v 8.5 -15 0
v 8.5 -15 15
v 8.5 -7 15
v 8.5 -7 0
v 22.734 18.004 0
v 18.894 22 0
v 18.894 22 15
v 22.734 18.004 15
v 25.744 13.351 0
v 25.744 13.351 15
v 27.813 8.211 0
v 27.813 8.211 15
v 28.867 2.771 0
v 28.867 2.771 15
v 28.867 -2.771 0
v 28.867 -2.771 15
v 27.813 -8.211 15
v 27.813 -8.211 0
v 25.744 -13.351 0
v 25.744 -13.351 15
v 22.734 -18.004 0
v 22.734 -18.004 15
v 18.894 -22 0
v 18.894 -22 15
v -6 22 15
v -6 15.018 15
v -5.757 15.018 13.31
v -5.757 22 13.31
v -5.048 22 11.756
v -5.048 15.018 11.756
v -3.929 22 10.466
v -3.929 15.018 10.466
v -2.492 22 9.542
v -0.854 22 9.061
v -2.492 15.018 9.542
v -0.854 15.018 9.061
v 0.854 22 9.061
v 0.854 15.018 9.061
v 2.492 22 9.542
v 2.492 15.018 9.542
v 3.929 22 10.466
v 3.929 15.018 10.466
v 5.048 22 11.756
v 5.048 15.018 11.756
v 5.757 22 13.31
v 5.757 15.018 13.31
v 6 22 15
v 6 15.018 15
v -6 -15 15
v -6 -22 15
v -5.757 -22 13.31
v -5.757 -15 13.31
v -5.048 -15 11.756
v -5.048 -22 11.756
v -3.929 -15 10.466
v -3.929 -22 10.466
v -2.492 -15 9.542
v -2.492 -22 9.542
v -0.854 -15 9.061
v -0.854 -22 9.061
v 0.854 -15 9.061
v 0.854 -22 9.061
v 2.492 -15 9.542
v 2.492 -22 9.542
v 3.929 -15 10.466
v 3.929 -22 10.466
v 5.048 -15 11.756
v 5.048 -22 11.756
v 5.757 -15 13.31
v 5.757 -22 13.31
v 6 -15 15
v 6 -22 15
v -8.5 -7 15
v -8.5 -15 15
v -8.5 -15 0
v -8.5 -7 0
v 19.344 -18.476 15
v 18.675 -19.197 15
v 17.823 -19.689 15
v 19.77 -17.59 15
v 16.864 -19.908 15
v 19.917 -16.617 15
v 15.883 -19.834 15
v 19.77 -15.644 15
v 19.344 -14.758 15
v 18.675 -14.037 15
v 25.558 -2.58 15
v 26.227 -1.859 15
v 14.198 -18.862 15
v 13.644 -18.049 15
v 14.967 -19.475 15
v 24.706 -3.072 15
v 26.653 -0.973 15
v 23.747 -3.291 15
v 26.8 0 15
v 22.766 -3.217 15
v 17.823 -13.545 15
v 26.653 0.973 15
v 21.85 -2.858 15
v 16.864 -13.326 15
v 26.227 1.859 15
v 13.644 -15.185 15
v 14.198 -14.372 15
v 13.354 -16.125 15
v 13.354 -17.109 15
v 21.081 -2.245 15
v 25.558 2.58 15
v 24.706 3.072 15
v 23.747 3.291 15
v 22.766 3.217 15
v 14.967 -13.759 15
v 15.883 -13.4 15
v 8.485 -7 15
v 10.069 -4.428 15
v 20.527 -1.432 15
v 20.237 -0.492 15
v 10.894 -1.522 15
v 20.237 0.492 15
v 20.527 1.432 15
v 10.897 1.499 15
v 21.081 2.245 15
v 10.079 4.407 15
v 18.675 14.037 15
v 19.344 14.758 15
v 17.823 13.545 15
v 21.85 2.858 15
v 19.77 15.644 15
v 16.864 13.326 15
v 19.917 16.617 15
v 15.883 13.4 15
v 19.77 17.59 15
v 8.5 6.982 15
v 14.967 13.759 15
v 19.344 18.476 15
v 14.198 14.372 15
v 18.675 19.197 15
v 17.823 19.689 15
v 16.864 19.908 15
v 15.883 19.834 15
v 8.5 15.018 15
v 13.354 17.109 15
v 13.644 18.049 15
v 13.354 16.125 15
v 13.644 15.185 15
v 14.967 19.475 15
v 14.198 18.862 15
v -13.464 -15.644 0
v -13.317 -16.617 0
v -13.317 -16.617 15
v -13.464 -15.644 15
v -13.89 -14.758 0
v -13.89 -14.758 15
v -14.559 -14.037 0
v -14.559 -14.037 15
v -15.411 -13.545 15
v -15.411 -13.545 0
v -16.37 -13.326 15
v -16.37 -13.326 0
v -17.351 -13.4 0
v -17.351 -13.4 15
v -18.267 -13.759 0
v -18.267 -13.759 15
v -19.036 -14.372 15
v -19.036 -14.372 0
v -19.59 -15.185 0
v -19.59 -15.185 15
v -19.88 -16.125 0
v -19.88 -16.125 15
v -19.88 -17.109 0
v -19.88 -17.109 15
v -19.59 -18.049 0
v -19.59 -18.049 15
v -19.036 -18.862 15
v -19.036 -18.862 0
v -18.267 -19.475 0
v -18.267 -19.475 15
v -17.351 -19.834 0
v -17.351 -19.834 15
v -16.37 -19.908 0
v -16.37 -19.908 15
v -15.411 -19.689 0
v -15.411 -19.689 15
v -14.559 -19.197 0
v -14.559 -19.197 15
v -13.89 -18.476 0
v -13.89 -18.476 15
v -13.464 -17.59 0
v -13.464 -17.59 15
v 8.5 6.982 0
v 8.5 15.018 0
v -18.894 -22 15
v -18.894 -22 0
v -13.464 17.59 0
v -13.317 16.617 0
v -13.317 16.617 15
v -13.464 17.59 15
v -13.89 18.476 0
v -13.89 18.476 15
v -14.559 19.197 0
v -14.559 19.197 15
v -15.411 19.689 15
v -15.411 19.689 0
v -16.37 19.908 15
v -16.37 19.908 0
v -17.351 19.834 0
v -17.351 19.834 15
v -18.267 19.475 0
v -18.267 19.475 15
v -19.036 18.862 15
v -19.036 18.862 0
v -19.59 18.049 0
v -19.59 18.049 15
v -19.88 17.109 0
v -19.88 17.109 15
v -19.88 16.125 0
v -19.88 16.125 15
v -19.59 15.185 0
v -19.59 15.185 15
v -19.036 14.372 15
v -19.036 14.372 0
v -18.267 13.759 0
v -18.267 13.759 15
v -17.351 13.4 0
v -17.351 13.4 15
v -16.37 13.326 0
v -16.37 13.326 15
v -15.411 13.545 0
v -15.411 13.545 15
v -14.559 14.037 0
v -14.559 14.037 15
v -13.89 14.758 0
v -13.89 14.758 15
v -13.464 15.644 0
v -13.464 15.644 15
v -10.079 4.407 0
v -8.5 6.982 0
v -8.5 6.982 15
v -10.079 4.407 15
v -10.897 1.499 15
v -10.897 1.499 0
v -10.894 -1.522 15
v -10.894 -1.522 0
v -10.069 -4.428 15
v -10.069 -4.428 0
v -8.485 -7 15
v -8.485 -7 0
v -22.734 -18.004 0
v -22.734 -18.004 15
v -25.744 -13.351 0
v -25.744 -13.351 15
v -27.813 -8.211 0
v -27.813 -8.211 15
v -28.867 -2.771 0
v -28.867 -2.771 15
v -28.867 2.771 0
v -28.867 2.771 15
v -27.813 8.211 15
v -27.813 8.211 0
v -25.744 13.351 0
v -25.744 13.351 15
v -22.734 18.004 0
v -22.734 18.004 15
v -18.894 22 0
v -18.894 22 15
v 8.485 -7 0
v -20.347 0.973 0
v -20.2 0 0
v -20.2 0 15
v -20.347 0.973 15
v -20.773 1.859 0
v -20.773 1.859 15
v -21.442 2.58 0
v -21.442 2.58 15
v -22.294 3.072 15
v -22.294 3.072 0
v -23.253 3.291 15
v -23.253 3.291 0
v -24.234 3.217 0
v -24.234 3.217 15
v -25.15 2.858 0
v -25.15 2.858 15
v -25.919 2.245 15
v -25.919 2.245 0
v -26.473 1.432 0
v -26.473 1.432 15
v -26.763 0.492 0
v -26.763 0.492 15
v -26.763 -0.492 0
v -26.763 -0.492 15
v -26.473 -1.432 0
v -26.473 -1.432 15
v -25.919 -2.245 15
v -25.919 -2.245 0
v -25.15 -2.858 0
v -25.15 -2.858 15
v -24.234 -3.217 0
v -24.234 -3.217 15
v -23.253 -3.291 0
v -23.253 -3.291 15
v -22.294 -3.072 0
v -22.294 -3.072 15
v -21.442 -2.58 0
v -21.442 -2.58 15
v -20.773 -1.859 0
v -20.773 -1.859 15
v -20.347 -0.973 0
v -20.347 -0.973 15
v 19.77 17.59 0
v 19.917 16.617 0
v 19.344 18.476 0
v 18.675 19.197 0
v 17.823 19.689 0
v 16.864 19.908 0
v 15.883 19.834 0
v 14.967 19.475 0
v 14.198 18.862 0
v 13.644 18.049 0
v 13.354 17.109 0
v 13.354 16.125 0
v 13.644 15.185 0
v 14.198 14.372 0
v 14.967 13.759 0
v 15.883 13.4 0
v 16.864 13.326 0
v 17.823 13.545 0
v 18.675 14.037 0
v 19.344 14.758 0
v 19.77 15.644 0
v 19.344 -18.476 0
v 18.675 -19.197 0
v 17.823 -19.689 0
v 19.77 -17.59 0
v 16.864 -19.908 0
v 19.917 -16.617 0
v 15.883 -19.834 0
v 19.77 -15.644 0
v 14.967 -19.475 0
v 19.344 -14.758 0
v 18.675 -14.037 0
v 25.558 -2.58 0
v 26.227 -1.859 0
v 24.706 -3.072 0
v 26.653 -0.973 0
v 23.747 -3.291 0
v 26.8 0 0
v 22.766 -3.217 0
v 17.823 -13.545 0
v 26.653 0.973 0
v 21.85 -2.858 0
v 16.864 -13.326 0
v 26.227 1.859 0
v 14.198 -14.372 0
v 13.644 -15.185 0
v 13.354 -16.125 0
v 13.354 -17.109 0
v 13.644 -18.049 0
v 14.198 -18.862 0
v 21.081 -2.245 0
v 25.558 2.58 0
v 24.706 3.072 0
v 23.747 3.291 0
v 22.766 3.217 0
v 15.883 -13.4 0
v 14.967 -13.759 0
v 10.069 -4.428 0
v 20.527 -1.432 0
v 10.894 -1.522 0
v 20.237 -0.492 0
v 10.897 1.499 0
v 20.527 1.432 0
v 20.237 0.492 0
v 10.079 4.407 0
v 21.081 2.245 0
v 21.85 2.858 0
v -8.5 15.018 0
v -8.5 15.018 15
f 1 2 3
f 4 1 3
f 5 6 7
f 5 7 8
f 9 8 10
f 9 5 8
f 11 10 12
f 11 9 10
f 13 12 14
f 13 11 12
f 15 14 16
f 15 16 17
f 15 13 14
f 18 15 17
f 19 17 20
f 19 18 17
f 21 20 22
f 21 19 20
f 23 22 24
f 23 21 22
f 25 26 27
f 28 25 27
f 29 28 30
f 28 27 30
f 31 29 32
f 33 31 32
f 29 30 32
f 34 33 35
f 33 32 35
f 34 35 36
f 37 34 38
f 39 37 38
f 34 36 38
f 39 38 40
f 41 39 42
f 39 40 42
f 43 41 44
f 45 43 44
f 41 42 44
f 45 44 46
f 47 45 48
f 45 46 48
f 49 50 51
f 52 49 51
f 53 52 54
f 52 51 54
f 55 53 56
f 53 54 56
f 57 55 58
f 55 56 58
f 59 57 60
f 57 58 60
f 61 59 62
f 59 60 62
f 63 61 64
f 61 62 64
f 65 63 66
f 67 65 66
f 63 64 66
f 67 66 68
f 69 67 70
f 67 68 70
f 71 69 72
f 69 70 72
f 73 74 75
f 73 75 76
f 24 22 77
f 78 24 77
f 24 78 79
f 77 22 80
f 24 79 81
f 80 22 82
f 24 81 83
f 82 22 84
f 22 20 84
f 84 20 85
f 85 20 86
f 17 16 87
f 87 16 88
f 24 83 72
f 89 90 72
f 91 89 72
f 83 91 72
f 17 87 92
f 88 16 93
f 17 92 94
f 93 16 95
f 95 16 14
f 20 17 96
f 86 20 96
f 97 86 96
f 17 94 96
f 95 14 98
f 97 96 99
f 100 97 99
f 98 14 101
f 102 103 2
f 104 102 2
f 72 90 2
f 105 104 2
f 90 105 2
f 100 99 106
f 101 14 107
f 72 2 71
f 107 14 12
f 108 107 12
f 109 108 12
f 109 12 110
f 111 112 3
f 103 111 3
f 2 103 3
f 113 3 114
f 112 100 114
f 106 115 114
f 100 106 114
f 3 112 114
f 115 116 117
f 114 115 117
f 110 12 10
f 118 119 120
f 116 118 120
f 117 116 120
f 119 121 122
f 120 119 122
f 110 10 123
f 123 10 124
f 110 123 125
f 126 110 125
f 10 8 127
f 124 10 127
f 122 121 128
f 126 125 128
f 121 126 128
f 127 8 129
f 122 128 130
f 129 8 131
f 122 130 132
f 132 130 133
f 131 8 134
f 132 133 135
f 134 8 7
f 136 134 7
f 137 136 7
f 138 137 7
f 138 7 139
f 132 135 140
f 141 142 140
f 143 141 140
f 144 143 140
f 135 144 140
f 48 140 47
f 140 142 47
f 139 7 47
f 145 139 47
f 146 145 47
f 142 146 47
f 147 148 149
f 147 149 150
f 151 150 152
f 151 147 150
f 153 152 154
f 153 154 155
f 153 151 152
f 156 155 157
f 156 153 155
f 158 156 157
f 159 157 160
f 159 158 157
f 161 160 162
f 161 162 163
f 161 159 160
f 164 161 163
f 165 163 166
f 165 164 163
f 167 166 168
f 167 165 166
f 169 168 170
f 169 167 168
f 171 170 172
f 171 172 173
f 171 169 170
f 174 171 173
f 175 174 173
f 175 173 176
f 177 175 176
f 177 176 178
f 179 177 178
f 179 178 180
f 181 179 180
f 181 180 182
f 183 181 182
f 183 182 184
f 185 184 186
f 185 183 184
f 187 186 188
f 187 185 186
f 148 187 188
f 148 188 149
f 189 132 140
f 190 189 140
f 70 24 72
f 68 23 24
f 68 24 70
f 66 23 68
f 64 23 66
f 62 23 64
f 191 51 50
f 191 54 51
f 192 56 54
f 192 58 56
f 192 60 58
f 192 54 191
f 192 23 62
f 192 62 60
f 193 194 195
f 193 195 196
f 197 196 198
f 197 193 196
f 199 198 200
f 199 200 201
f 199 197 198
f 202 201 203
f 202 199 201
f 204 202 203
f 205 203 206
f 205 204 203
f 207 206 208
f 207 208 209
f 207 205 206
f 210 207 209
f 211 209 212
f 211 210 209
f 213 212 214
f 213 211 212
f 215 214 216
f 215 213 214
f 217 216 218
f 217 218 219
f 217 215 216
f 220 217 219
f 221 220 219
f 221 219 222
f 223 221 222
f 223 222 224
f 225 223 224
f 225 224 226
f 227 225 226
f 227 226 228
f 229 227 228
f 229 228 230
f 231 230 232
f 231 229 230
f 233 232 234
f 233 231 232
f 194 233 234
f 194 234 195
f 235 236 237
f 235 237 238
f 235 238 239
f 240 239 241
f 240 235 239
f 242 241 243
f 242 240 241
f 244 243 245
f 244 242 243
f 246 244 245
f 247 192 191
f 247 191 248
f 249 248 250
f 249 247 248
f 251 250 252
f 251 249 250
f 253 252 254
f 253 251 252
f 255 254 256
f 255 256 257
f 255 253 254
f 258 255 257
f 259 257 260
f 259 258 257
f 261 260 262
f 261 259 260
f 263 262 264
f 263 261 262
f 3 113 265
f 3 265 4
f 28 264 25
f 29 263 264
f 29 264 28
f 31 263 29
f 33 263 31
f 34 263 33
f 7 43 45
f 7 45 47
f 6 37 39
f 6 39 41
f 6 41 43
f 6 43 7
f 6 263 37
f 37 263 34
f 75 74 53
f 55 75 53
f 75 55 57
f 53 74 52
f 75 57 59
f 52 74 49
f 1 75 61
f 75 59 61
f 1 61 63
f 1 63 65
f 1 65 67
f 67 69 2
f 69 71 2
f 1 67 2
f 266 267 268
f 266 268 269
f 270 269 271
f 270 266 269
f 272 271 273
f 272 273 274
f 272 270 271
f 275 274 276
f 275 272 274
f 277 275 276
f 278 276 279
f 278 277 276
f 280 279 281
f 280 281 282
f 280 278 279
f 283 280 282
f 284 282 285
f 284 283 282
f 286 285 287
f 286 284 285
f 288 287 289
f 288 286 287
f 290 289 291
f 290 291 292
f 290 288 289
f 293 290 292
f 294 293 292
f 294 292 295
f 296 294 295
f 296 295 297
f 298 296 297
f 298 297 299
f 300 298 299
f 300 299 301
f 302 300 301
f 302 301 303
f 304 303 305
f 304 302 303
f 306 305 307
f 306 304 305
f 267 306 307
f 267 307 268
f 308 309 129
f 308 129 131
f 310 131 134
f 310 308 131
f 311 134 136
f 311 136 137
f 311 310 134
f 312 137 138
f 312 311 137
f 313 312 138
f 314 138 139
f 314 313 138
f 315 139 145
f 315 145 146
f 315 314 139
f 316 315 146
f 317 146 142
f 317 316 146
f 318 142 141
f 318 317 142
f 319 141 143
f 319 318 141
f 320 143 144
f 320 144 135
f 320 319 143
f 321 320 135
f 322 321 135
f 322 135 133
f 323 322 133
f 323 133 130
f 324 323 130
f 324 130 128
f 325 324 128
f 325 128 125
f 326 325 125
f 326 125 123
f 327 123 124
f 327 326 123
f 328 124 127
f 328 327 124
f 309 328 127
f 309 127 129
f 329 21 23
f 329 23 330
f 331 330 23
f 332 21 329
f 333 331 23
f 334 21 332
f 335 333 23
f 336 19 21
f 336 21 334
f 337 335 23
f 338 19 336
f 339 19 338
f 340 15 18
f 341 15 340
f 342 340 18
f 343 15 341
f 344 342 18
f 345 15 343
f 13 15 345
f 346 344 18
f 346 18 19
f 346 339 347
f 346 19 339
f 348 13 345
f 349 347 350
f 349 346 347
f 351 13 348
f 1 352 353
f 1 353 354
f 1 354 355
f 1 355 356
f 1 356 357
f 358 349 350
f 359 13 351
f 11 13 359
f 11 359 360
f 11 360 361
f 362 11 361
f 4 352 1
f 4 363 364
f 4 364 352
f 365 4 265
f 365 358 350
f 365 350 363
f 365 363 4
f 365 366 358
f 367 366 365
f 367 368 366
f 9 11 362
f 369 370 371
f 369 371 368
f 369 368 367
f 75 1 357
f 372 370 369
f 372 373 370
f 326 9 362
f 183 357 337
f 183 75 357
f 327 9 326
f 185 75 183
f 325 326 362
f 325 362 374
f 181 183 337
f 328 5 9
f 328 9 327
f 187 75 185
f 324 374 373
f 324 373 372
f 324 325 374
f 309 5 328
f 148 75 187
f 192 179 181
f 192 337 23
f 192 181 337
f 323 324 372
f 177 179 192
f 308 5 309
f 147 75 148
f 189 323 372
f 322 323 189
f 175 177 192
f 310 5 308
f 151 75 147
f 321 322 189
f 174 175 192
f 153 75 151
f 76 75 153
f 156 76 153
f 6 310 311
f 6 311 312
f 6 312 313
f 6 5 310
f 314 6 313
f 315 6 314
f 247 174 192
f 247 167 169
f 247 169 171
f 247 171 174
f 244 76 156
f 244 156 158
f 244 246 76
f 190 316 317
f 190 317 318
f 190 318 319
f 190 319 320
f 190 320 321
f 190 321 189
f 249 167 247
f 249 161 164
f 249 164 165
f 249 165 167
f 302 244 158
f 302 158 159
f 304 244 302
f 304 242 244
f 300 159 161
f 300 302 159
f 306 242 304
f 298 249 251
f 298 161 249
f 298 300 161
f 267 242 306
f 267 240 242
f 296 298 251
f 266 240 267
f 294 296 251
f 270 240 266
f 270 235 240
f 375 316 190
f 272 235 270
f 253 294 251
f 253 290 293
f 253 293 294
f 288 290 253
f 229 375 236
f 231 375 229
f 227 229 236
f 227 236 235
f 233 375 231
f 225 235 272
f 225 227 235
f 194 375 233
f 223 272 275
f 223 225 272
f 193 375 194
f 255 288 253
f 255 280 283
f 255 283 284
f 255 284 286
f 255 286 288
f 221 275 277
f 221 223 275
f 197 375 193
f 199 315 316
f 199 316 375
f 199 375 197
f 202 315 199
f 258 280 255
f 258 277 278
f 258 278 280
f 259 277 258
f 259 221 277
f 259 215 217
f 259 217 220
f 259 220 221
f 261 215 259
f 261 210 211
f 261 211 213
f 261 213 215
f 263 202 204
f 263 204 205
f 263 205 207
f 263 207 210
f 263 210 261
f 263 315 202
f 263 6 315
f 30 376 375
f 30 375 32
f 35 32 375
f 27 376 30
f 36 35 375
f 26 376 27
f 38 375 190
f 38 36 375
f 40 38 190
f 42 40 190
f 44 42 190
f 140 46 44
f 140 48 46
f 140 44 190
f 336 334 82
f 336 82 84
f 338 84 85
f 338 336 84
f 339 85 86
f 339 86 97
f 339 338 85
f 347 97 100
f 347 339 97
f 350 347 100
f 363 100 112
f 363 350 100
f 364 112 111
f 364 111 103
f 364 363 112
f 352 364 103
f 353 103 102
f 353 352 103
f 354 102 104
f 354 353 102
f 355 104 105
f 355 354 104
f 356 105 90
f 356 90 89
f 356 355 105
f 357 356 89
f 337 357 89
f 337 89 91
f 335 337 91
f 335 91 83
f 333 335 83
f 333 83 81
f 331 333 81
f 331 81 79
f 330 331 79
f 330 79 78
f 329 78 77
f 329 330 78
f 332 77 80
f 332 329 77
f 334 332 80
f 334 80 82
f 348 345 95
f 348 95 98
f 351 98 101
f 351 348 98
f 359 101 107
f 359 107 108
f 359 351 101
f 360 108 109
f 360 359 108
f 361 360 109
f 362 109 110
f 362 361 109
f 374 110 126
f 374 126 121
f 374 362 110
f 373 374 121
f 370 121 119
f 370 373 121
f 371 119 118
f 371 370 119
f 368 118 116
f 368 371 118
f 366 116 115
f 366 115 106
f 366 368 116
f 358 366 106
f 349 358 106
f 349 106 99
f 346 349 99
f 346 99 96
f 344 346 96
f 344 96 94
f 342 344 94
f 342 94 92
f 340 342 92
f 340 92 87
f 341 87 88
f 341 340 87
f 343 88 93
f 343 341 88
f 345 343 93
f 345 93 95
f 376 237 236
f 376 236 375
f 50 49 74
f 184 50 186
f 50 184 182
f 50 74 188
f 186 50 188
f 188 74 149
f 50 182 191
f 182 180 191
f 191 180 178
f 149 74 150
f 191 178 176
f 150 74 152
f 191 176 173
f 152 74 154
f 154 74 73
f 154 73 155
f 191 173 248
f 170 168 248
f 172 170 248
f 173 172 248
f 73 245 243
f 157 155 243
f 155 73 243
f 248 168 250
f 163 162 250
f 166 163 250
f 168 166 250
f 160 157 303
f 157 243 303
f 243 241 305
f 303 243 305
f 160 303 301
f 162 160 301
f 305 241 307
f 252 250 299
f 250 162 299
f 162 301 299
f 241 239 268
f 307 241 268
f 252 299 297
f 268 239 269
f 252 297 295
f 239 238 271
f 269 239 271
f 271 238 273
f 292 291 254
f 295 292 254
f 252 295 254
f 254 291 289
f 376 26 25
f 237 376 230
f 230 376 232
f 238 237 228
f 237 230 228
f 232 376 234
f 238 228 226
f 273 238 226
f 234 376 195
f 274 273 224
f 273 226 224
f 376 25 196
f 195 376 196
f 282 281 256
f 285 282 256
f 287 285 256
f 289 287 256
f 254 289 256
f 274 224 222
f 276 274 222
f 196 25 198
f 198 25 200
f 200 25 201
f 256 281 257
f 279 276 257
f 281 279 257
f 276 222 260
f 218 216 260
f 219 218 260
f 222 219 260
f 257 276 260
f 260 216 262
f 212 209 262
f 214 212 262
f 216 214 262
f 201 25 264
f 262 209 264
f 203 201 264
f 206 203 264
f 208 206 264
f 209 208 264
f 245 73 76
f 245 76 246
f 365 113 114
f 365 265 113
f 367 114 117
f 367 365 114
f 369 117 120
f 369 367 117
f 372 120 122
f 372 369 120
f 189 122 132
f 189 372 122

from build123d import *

# Parameters (mm, degrees)
SZKIC1_R                    = 3.3
SZKIC1_R_2                  = 11
DODANIE_WYCI_GNI_CIE2_DEPTH = 15
SZKIC2_W                    = 17
SZKIC2_H                    = 8
SZKIC2_H_2                  = 8.035759956
WYTNIJ_WYCI_GNI_CIE1_DEPTH  = 16
SZKIC3_R                    = 6
WYTNIJ_WYCI_GNI_CIE2_DEPTH  = 45


with BuildPart() as part:
    # Szkic1 → Dodanie-wyciągnięcie2 (new body)
    with BuildSketch(Plane.XY):
        with BuildLine():
            Line((-18.894443628, 22), (18.894443628, 22))
            ThreePointArc((18.894443628, 22), (29, 0), (18.894443628, -22))
            Line((18.894443628, -22), (-18.894443628, -22))
            ThreePointArc((-18.894443628, -22), (-29, 0), (-18.894443628, 22))
        make_face()
        with Locations((-23.5, 0)):
            Circle(SZKIC1_R, mode=Mode.SUBTRACT)
        with Locations((-16.617009358, 16.617009358)):
            Circle(SZKIC1_R, mode=Mode.SUBTRACT)
        with Locations((16.617009358, 16.617009358)):
            Circle(SZKIC1_R, mode=Mode.SUBTRACT)
        with Locations((23.5, 0)):
            Circle(SZKIC1_R, mode=Mode.SUBTRACT)
        with Locations((16.617009358, -16.617009358)):
            Circle(SZKIC1_R, mode=Mode.SUBTRACT)
        with Locations((-16.617009358, -16.617009358)):
            Circle(SZKIC1_R, mode=Mode.SUBTRACT)
        Circle(SZKIC1_R_2, mode=Mode.SUBTRACT)
    extrude(amount=DODANIE_WYCI_GNI_CIE2_DEPTH)

    # Szkic2 → Wytnij-wyciągnięcie1 (cut, through all)
    with BuildSketch(Plane.XY.offset(15)):
        with Locations((0, -11)):
            Rectangle(SZKIC2_W, SZKIC2_H)
        with Locations((0, 11)):
            Rectangle(SZKIC2_W, SZKIC2_H_2)
    extrude(amount=-WYTNIJ_WYCI_GNI_CIE1_DEPTH, mode=Mode.SUBTRACT)

    # Szkic3 → Wytnij-wyciągnięcie2 (cut, through all)
    with BuildSketch(Plane.XZ.offset(22)):
        with Locations((0, 15)):
            Circle(SZKIC3_R)
    extrude(amount=-WYTNIJ_WYCI_GNI_CIE2_DEPTH, mode=Mode.SUBTRACT)


solid = part.part
